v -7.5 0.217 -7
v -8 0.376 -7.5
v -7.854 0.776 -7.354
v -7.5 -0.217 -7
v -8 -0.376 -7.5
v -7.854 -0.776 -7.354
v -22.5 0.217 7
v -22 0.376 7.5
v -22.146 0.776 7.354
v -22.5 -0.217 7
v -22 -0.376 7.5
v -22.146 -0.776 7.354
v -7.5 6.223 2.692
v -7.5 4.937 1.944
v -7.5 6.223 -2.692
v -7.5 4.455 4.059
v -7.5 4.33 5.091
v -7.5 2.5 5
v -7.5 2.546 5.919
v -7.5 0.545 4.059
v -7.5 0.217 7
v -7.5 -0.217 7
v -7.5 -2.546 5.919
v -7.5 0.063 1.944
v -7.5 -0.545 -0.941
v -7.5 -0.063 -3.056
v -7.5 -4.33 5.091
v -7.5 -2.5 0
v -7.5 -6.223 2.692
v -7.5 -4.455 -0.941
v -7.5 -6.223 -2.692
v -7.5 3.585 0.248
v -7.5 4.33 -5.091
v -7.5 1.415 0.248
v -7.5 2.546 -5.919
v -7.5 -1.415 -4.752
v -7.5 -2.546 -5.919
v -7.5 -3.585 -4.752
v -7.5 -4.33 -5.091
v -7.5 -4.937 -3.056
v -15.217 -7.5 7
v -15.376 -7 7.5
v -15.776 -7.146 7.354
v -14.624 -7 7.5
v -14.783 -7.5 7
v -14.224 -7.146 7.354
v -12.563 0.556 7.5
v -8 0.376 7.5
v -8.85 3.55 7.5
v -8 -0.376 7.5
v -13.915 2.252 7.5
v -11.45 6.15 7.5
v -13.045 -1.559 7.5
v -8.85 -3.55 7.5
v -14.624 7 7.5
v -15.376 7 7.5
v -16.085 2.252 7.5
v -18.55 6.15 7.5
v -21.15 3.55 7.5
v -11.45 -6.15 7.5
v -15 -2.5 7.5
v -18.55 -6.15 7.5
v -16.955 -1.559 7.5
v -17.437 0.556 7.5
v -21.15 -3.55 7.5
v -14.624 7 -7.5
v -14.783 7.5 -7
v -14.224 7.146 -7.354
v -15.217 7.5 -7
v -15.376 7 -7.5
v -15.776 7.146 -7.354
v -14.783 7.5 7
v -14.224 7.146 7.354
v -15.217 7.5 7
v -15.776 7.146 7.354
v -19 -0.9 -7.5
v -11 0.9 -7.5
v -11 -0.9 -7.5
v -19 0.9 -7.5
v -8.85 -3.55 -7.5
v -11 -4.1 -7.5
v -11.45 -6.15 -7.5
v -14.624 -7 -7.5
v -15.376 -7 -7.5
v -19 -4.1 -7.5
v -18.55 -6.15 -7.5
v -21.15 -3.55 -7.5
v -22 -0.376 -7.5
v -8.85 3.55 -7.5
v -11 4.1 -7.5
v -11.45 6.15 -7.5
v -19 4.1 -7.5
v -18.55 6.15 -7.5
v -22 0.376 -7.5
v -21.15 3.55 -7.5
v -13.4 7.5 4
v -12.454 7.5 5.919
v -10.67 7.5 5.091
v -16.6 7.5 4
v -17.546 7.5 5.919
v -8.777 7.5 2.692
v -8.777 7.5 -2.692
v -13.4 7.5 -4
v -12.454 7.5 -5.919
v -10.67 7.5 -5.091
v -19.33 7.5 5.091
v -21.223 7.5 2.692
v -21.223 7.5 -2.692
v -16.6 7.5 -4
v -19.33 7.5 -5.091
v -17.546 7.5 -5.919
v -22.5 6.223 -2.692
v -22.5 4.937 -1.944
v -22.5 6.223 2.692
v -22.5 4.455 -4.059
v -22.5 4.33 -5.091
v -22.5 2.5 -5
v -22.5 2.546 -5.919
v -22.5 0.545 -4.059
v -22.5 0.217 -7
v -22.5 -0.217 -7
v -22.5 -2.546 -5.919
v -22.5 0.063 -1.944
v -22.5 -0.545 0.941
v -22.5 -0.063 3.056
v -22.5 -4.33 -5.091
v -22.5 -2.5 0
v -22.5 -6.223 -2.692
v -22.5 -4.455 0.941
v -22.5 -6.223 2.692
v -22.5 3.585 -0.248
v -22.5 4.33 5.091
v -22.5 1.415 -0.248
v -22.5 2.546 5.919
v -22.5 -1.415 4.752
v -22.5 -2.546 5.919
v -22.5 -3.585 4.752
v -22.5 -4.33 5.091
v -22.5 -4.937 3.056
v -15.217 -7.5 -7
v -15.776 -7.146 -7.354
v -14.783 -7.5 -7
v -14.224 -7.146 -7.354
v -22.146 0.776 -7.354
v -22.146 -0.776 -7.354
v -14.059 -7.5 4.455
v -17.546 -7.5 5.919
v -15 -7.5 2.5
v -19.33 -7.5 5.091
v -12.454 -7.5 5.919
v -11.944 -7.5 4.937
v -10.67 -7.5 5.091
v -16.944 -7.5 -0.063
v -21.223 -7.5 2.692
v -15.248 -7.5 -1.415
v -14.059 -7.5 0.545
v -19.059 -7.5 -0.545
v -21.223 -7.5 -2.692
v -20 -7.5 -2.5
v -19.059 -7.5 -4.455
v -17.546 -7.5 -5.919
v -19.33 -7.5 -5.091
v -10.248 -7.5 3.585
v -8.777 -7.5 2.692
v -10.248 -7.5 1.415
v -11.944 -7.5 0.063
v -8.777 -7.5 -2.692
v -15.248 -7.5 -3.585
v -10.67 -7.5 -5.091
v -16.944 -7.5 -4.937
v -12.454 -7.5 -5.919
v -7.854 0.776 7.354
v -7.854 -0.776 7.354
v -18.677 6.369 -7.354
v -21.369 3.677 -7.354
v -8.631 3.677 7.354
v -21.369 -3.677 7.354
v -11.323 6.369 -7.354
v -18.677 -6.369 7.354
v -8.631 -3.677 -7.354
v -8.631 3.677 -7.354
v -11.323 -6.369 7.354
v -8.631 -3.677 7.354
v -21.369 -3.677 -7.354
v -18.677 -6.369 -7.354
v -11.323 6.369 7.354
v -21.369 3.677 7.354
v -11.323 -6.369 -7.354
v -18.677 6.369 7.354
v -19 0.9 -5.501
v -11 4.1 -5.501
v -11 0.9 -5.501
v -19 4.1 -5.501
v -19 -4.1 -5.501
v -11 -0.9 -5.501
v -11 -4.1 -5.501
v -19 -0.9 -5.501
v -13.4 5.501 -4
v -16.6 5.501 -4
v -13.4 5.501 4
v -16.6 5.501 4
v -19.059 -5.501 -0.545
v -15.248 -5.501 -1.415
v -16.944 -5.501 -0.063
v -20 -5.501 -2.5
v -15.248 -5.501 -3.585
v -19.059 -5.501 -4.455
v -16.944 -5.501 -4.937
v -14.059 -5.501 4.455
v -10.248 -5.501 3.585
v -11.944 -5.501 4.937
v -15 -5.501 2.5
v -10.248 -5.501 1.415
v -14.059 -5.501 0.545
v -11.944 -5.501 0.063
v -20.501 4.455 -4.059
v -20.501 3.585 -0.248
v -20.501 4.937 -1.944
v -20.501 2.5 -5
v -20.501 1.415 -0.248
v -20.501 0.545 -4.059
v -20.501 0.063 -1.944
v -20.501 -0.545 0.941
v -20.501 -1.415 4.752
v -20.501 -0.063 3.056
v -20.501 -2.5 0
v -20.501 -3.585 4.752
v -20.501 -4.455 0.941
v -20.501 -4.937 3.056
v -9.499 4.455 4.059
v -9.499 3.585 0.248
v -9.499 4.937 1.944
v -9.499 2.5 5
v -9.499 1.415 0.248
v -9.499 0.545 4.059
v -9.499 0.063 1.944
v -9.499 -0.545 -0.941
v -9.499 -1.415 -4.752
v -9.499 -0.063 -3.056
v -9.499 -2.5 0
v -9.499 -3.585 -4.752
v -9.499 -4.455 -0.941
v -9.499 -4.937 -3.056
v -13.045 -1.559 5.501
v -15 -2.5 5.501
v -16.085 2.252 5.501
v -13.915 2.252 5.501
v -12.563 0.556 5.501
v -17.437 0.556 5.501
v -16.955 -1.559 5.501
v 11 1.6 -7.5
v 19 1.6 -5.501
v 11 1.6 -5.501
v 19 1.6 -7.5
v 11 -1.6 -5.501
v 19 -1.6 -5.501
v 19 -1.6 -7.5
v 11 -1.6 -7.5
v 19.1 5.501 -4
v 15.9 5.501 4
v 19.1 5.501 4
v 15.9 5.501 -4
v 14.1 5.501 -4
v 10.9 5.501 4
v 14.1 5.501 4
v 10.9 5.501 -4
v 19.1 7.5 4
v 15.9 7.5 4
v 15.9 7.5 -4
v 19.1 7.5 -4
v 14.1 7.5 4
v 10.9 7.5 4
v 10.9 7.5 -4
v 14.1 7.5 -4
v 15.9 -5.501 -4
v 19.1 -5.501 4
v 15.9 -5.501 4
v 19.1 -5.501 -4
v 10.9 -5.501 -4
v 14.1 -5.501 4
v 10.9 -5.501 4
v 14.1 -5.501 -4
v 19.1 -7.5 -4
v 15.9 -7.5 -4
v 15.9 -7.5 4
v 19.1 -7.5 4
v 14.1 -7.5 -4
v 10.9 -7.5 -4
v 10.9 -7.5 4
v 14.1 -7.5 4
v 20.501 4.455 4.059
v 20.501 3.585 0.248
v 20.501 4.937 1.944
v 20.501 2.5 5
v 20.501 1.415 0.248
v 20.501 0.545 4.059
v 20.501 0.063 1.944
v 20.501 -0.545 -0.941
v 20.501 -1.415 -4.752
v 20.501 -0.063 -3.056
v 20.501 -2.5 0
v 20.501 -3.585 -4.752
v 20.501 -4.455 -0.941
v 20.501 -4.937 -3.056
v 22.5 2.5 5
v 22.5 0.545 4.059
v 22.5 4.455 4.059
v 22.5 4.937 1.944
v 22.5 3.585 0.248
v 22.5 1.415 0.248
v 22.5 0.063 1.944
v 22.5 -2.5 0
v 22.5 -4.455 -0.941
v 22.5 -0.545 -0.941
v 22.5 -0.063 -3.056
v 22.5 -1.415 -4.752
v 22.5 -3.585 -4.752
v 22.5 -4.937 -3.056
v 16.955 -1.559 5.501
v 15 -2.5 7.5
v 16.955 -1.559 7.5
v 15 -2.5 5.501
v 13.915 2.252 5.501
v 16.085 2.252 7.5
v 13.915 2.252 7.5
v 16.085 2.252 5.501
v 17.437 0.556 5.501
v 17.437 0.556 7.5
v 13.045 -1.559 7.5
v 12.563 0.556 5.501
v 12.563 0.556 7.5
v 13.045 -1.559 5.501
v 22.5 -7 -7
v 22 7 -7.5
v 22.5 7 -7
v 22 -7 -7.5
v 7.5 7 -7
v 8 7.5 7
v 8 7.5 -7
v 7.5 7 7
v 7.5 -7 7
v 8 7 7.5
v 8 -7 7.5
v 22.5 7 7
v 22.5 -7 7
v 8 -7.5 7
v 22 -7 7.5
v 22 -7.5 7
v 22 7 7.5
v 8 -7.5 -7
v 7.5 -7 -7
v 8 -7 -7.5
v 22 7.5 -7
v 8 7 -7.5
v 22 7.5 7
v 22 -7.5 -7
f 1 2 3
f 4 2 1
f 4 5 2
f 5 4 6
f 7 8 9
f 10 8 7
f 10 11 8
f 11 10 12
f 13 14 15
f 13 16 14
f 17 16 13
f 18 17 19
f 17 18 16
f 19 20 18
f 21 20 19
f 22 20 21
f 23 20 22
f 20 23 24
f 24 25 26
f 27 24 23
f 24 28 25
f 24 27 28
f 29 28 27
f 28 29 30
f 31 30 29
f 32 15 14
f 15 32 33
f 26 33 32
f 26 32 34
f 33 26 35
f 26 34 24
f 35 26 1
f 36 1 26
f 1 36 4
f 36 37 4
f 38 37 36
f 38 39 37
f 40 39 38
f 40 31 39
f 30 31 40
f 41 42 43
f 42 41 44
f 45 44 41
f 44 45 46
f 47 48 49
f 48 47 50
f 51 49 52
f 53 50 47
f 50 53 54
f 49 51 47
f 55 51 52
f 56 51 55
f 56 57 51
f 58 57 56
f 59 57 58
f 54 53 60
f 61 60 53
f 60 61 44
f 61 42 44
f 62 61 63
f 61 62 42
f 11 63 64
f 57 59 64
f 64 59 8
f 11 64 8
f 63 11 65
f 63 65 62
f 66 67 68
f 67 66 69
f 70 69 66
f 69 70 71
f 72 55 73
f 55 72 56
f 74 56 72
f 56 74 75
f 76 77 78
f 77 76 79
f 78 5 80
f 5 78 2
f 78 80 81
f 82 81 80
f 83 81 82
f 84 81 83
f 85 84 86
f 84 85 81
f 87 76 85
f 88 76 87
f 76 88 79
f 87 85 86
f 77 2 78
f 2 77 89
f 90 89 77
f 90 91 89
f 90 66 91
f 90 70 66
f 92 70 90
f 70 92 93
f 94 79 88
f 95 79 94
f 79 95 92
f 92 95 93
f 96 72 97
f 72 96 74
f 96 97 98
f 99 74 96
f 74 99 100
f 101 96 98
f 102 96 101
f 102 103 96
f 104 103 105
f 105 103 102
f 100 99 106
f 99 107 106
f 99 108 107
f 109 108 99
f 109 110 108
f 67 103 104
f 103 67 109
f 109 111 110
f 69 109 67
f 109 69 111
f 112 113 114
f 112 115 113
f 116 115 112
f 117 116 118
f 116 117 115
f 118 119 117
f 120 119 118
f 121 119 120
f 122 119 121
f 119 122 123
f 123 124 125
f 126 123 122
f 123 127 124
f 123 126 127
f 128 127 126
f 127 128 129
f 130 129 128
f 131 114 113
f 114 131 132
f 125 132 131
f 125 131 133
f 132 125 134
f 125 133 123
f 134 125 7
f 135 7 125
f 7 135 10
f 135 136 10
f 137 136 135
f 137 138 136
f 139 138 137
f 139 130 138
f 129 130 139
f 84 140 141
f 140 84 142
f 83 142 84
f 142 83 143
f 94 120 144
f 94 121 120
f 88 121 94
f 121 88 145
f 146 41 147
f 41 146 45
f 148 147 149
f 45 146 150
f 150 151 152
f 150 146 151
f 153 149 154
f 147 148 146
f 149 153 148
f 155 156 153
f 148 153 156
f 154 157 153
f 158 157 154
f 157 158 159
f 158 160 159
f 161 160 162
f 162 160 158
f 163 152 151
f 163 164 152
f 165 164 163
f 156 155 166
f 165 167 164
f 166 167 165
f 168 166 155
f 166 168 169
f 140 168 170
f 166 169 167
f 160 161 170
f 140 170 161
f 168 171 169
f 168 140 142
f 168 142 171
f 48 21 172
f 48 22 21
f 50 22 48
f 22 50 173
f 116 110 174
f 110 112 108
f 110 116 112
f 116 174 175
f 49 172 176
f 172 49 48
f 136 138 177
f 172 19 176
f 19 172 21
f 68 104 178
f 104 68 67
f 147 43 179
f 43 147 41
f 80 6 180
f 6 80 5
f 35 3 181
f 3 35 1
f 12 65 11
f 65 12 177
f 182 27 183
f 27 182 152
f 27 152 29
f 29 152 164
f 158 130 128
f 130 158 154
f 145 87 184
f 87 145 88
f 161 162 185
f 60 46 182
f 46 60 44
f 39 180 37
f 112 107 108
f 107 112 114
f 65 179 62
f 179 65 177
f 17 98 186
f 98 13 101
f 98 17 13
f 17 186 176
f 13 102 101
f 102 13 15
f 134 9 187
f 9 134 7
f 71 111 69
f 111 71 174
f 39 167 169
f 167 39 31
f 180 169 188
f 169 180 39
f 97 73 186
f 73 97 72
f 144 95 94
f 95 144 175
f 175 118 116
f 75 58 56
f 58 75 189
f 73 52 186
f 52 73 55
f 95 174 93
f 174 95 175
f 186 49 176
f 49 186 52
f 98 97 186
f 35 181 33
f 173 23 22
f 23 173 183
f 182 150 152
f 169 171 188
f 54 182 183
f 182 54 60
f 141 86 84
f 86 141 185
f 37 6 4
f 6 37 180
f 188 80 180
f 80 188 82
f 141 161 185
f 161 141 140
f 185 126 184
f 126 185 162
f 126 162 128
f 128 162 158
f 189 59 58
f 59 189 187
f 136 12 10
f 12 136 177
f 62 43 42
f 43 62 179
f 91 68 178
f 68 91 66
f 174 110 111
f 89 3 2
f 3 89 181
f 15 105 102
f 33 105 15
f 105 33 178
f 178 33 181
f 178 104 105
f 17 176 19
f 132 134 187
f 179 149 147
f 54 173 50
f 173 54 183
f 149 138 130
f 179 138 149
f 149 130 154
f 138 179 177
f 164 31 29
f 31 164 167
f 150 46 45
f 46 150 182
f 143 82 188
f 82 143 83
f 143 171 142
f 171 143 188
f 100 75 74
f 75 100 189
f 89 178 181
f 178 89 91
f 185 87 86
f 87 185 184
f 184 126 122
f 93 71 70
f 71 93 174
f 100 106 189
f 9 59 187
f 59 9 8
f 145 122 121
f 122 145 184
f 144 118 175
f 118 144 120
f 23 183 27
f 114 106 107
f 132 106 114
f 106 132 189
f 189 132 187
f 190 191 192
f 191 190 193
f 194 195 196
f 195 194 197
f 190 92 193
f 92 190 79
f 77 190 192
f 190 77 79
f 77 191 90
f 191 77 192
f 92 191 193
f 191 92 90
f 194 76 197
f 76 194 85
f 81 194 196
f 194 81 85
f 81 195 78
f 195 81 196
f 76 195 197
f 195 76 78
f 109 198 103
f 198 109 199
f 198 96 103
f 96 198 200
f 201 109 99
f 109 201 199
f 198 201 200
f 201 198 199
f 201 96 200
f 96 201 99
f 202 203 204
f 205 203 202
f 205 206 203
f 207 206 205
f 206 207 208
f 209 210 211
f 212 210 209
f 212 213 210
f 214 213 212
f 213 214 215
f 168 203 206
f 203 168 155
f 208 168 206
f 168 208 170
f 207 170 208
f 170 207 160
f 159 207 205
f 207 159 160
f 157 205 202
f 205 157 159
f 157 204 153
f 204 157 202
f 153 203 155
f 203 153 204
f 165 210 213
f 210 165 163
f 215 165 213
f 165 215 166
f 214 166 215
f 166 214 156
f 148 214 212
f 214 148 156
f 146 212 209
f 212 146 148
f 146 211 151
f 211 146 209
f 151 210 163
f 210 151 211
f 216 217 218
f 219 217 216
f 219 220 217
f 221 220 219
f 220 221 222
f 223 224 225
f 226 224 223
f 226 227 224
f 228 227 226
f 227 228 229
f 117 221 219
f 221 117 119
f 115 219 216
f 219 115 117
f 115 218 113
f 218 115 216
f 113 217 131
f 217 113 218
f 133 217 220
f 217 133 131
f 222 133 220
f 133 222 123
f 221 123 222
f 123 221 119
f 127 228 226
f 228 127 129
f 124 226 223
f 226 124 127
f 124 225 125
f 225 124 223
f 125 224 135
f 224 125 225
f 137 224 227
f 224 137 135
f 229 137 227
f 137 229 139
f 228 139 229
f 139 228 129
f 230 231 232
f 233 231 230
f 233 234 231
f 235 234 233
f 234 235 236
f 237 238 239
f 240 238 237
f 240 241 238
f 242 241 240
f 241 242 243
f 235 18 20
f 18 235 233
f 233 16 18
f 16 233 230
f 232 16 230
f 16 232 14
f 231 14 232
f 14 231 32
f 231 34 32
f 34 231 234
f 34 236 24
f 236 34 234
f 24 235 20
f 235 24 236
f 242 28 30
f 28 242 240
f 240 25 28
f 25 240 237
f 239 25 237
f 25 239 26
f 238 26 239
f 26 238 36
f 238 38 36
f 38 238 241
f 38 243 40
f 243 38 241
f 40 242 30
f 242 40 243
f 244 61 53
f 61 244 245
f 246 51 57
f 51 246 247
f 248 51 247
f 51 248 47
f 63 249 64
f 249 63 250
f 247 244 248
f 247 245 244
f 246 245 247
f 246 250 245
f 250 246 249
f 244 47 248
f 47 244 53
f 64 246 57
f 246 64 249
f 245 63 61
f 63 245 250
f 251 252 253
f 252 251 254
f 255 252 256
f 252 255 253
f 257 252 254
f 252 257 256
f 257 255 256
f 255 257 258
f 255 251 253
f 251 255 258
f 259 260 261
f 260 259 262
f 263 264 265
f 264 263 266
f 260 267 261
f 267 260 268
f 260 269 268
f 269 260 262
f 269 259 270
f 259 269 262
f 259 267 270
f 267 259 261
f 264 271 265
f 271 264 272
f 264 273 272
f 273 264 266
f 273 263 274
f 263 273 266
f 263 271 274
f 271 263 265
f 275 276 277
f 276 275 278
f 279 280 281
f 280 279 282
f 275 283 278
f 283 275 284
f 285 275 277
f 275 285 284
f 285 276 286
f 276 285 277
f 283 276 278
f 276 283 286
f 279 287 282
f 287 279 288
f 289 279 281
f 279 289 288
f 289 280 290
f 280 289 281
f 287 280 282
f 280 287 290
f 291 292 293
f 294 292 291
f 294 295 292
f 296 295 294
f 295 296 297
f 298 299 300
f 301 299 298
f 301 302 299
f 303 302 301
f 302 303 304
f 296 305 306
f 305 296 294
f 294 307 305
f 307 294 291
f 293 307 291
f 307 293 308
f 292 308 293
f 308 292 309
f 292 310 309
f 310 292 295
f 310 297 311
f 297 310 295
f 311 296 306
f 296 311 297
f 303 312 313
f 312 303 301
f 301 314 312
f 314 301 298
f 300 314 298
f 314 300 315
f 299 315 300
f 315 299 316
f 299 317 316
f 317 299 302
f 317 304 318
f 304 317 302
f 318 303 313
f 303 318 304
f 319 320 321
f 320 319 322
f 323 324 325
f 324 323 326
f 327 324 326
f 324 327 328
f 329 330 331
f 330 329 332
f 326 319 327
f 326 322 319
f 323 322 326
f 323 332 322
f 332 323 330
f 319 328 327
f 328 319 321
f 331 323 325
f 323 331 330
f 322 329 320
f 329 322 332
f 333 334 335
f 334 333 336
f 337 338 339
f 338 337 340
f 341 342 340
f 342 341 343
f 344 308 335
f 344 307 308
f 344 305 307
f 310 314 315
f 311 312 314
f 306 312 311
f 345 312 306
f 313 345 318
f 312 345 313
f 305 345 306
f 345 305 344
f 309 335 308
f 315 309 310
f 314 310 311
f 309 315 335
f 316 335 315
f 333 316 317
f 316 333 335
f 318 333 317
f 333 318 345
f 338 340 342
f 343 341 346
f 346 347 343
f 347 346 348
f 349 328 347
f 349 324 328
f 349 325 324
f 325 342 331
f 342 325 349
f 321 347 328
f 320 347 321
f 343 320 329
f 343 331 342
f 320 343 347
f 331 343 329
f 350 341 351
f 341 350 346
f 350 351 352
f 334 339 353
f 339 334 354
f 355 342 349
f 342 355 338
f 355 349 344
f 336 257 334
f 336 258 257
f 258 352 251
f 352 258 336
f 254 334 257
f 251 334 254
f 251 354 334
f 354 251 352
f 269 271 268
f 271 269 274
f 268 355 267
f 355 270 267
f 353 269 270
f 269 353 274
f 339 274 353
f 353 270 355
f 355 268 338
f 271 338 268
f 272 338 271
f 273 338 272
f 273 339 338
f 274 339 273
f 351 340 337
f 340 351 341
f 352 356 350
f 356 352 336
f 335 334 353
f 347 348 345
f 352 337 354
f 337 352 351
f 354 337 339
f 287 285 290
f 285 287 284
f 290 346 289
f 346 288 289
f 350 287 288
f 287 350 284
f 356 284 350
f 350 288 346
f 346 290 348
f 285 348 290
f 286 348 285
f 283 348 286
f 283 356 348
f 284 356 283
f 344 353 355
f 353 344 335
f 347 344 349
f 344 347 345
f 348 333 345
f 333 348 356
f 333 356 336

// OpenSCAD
// file: common.scad
// Unless otherwise specified, each resulting shape is
// resting on the XY plane, centered on the Z axis.

// A small amount to make sure shapes overlap when needed. This
// is well below the resolution of my 3D printer, so it
// shouldn't affect the final result.
eps = 0.001;

// If printing, use high quality renderings.
print = false;
$fa = print ? 5 : 30;
$fs = print ? 0.3 : 1;

// Standard chamfer on all edges and corners. This makes the
// pieces more comfortable to handle.
chamfer = 0.5;

// A regular octahedron centered on the origin with its vertices
// on the axes. 'axis' gives its full length along each axis.
module octahedron(axis) {
  // Top and bottom halves.
  for (a = [-1, 1])
    scale([1, 1, a])
      // Extrude a square into a pyramid.
      linear_extrude(axis/2, scale=0)
        rotate([0, 0, 45])
          square(norm([axis/2, axis/2]), center=true);
}

// 'd' is the outer dimensions of the box.
module chamfered_box(d) {
  assert(d.x >= 1);
  assert(d.y >= 1);
  assert(d.z >= 1);

  // Raise the result up so it is resting on the XY plane.
  translate([0, 0, d.z/2]) {
    minkowski() {
      // The desired cube, scaled back by the chamfer distance
      // in all directions.
      cube(d - [chamfer*2, chamfer*2, chamfer*2], center=true);
      octahedron(chamfer*2);
    }
  }
}

module chamfered_disk(height, radius) {
  assert(radius >= 0.5);
  assert(height >= 1);

  // Raise the result up so it is resting on the XY plane.
  translate([0, 0, height/2]) {
    minkowski() {
      // The desired disk, scaled back by the chamfer distance
      // in all directions.
      cylinder(height-chamfer*2, r=radius-chamfer, center=true);
      octahedron(chamfer*2);
    }
  }
}

locking_lug_dims = [2.3, 2.3, 2+2*eps];

// A snug fit for gluing.
module locking_lug() {
  translate([0, 0, locking_lug_dims.z/2-eps])
    cube(locking_lug_dims, center=true);
}

module locking_socket(bottom=false) {
  // Make extra sure the lug will fit all the way into
  // the hole.
  extra_depth = 0.4;
  
  // When printing this on the bottom of a model, it
  // needs to be a bit wider to account for elephant-foot.
  extra_width = bottom ? 0.3 : 0.2;
  
  extra = [extra_width, extra_width, extra_depth];
  translate([0, 0, (locking_lug_dims.z+extra_depth)/2-eps])
    cube(locking_lug_dims + extra, center=true);
}
// main file
include <common.scad>

// Try a 50% fill when printing these. With a 20% fill the
// dice feel quite light.

// A standard size die is 15mm.
//
// Models in this file are centered on the origin.

module square_die_blank() {
  translate([0, 0, -7.5])
    chamfered_box([15, 15, 15]);
}

// Accepts six 2-D children for the six die faces.
module die_imprint() {
  // An engrave depth of 1 yielded a very clean print, but
  // the symbols were hard to see.
  engrave_depth = 2;

  for (case = [
    [0, [0, 0, 1]],  
    [1, [1, 0, 0]],  
    [2, [-1, 0, 0]],  
    [3, [0, 1, 0]],  
    [4, [0, -1, 0]],  
    [5, [0, 2, 1]],  
  ])
    rotate(case[1]*90)
      translate([0, 0, -7.5-eps])
        linear_extrude(engrave_depth)
          children(case[0]);
}

// I tried printing actual sword and star icons, but worried
// that their detail would get messed up with deeper
// envgravings. So instead I have chosen idealized symbols
// which should be bridgable. These new shapes align better
// with the die shapes anyway (circles and squares).

module one_sword() {
  scale([1.6, 4, 2]) {
    polygon([
      [-1, -1],
      [-1, 1],
      [1, 1],
      [1, -1],
    ]);
  }
}

module two_swords() {
  for (a = [-1, 1])
    translate(a * [-2.5, 0, 0])
      one_sword();
}

module one_star() {
  scale(2.5 * [1, 1, 1]) {
    circle(1);
  }
}

module two_stars() {
  for (a = [-1, 1])
    translate(a * [-2.5, -2.5, 0])
      one_star();
}

module empty() {}

// Used for prototyping 2D shapes.
module backdrop() {
  color("purple")
    translate([0, 0, -2])
      linear_extrude(1)
        circle(7);
}

module square_die() {
  difference() {
    square_die_blank();

    die_imprint() {
      one_sword();
      two_swords();
      two_swords();
      empty();
      two_stars();
      one_star();
    }
  }
}

module rounded_die() {
  difference() {
    intersection() {
      square_die_blank();
      sphere(10.4);
    }
    
    die_imprint() {
      two_swords();
      one_sword();
      // Reflect this one to make the die look nice.
      scale([-1, 1, 1]) two_stars();
      two_stars();
      two_stars();
      one_star();
    }
  }
}


// Print 2 dice.
translate([-15, 0, 0])
  rounded_die();
translate([15, 0, 0])
  square_die();
